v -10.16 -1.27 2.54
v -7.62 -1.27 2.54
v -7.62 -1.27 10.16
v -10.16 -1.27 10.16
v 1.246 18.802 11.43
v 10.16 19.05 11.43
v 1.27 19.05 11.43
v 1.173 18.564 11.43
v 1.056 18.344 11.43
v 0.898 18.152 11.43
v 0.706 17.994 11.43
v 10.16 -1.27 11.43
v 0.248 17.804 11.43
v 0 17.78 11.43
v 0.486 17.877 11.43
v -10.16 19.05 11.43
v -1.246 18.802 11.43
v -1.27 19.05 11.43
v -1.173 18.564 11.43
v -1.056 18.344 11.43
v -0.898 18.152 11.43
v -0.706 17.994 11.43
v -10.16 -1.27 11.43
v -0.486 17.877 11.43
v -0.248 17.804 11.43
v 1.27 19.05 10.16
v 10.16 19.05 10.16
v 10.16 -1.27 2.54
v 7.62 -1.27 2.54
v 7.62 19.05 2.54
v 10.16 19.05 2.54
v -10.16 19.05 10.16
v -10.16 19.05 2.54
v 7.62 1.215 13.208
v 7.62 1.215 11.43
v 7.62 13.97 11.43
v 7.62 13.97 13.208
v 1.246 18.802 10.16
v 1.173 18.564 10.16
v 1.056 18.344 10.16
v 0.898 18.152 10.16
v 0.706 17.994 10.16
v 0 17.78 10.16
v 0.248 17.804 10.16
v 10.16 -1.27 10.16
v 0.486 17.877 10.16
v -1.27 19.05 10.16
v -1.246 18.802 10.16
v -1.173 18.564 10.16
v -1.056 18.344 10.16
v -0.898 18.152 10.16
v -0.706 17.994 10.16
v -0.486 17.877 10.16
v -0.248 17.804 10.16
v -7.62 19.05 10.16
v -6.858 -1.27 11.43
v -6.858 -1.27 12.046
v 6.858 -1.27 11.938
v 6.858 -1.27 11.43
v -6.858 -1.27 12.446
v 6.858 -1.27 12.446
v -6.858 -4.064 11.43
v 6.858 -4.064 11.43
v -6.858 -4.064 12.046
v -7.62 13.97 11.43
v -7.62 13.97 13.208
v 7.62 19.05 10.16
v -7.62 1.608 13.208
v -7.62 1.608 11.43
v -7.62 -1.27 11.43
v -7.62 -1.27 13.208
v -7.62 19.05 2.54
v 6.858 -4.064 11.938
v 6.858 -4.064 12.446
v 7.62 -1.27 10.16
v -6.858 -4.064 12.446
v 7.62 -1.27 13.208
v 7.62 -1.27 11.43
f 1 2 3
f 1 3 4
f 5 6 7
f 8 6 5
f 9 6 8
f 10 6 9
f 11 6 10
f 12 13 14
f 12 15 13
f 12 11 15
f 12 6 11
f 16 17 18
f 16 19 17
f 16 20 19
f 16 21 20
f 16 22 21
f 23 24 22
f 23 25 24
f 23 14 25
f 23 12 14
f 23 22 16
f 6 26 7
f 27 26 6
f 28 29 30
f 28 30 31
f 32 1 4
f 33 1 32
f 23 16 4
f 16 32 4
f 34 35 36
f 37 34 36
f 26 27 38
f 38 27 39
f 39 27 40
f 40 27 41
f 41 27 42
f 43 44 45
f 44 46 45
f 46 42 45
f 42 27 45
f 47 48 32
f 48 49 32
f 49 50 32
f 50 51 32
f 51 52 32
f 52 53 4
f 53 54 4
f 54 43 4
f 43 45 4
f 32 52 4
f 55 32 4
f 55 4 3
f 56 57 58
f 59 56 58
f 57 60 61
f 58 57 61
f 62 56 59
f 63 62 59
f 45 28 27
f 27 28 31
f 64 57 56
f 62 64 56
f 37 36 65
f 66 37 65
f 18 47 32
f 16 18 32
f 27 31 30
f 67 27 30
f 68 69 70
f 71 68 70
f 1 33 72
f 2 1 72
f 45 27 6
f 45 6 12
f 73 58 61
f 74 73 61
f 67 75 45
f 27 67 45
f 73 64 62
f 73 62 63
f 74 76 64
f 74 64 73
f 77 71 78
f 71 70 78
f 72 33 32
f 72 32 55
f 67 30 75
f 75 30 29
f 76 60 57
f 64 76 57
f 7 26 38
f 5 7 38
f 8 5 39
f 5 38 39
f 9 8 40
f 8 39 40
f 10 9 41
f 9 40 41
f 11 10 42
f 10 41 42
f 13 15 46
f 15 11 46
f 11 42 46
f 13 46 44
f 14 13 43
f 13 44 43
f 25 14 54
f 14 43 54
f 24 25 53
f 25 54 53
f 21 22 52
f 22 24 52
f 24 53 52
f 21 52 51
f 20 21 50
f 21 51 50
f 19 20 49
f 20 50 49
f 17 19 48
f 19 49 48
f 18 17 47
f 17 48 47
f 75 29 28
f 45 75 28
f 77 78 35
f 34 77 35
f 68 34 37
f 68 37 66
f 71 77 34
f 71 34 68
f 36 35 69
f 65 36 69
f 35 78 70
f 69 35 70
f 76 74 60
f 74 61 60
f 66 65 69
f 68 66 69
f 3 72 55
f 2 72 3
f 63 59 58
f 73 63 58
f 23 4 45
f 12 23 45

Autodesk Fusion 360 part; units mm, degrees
sketch "Szkic1" plane through (0, 0, 0) normal (0, 0, 1) x (1, 0, 0)
ref_plane "Płaszczyzna konstrukcyjna1" through (0, 8.89, 2.54) normal (0, 0, 1) x (1, 0, 0)
sketch "Szkic2" plane through (0, 0, 2.54) normal (0, 0, 1) x (1, 0, 0)
  line L0 (-10.16, 19.05) -> (-7.62, 19.05)
  line L1 (-7.62, 19.05) -> (-7.62, -1.27)
  line L2 (-7.62, -1.27) -> (-10.16, -1.27)
  line L3 (-10.16, -1.27) -> (-10.16, 19.05)
  line L4 (-2.54, 19.05) -> (-11.43, 19.05)
  line L5 (-8.89, -1.27) -> (-8.89, 2.286) construction
  line L6 (0, 0) -> (0, 6.35) construction
  line L7 (0, 0) -> (0, 6.35) construction
  line L8 (10.16, 19.05) -> (7.62, 19.05)
  line L9 (7.62, -1.27) -> (10.16, -1.27)
  line L10 (8.89, -1.27) -> (8.89, 2.286) construction
  line L11 (7.62, 19.05) -> (7.62, -1.27)
  line L12 (10.16, -1.27) -> (10.16, 19.05)
  point P0 (-8.89, 0)
  point P1 (8.89, 0)
  dimension "d1" = 2.54
  dimension "d2" = 20.32
extrude "Wyciągnięcie proste1" add sketch "Szkic2" along normal blind 7.62 makes body 1 at (-7.62, 12.2767, 7.62) makes body 2 at (10.16, 5.5033, 5.08)
sketch "Szkic3" plane through (0, 0, 10.16) normal (0, 0, 1) x (-1, 0, 0)
  line L0 (7.62, -19.05) -> (10.16, -19.05)
  line L1 (10.16, -19.05) -> (10.16, 1.27)
  line L2 (10.16, 1.27) -> (7.62, 1.27)
  line L3 (7.62, 1.27) -> (7.62, -19.05)
  line L4 (-10.16, -19.05) -> (-10.16, 1.27)
  line L5 (-10.16, 1.27) -> (10.16, 1.27)
  line L6 (10.16, 1.27) -> (10.16, -19.05)
  arc A0 (1.27, -19.05) -> (-1.27, -19.05) centre (0, -19.05) ccw
  line L7 (10.16, -19.05) -> (1.27, -19.05)
  line L8 (-1.27, -19.05) -> (-10.16, -19.05)
  dimension "d5" = 2.54
  dimension "d6" = 7.62
extrude "Wyciągnięcie proste1'" add sketch "Szkic3" along normal blind 1.27 separate body makes body 3 in component "Component"
sketch "Szkic1 (2)" plane through (0, 0, 11.43) normal (0, 0, 1) x (-1, 0, 0) in component "Component'"
  arc A0 (1.27, -19.05) -> (-1.27, -19.05) centre (0, -19.05) ccw
  line L0 (1.27, -19.05) -> (10.16, -19.05)
  line L1 (10.16, -19.05) -> (10.16, 1.27)
  line L2 (10.16, 1.27) -> (-10.16, 1.27)
  line L3 (-10.16, 1.27) -> (-10.16, -19.05)
  line L4 (-10.16, -19.05) -> (-1.27, -19.05)
  line L5 (7.62, 1.27) -> (-7.62, 1.27)
  line L6 (-7.62, 1.27) -> (-7.62, -13.97)
  line L7 (-7.62, -13.97) -> (7.62, -13.97)
  line L8 (7.62, -13.97) -> (7.62, 1.27)
  line L9 (-7.62, -1.2152) -> (-10.16, -1.2152)
  line L10 (7.62, -1.6081) -> (10.16, -1.6081)
  dimension "d9" = 15.24
  dimension "d10" = 15.24
extrude "Wyciągnięcie proste1''" add sketch "Szkic1 (2)" along normal blind 1.778 separate body contours L2 L5 L6 L7 L8 makes body 4 in component "Component'"
sketch "Szkic1 (3)" plane through (0, -1.27, 0) normal (0, -1, 0) x (1, 0, 0) in component "Component''"
  line L0 (-7.62, 11.43) -> (7.62, 11.43)
  line L1 (7.62, 11.43) -> (7.62, 13.208)
  line L2 (7.62, 13.208) -> (-7.62, 13.208)
  line L3 (-7.62, 13.208) -> (-7.62, 11.43)
  line L4 (-6.858, 11.43) -> (6.858, 11.43)
  line L5 (6.858, 11.43) -> (6.858, 12.446)
  line L6 (6.858, 12.446) -> (-6.858, 12.446)
  line L7 (-6.858, 12.446) -> (-6.858, 11.43)
  line L8 (-7.62, 12.0457) -> (-6.858, 12.0457)
  line L9 (6.858, 11.938) -> (7.62, 11.938)
extrude "Wyciągnięcie proste1'''" add sketch "Szkic1 (3)" along normal blind 2.794 separate body contours L0 L4 L5 L6 L7 makes body 5 in component "Component''"
component "Component" placed x (1, 0, 0) y (0, 1, 0) z (0, 0, 1) at (0, 0, 0)
component "Component'" placed x (1, 0, 0) y (0, 1, 0) z (0, 0, 1) at (0, 0, 0) in component "Component"
component "Component''" placed x (1, 0, 0) y (0, 1, 0) z (0, 0, 1) at (0, 0, 0) in component "Component'"
